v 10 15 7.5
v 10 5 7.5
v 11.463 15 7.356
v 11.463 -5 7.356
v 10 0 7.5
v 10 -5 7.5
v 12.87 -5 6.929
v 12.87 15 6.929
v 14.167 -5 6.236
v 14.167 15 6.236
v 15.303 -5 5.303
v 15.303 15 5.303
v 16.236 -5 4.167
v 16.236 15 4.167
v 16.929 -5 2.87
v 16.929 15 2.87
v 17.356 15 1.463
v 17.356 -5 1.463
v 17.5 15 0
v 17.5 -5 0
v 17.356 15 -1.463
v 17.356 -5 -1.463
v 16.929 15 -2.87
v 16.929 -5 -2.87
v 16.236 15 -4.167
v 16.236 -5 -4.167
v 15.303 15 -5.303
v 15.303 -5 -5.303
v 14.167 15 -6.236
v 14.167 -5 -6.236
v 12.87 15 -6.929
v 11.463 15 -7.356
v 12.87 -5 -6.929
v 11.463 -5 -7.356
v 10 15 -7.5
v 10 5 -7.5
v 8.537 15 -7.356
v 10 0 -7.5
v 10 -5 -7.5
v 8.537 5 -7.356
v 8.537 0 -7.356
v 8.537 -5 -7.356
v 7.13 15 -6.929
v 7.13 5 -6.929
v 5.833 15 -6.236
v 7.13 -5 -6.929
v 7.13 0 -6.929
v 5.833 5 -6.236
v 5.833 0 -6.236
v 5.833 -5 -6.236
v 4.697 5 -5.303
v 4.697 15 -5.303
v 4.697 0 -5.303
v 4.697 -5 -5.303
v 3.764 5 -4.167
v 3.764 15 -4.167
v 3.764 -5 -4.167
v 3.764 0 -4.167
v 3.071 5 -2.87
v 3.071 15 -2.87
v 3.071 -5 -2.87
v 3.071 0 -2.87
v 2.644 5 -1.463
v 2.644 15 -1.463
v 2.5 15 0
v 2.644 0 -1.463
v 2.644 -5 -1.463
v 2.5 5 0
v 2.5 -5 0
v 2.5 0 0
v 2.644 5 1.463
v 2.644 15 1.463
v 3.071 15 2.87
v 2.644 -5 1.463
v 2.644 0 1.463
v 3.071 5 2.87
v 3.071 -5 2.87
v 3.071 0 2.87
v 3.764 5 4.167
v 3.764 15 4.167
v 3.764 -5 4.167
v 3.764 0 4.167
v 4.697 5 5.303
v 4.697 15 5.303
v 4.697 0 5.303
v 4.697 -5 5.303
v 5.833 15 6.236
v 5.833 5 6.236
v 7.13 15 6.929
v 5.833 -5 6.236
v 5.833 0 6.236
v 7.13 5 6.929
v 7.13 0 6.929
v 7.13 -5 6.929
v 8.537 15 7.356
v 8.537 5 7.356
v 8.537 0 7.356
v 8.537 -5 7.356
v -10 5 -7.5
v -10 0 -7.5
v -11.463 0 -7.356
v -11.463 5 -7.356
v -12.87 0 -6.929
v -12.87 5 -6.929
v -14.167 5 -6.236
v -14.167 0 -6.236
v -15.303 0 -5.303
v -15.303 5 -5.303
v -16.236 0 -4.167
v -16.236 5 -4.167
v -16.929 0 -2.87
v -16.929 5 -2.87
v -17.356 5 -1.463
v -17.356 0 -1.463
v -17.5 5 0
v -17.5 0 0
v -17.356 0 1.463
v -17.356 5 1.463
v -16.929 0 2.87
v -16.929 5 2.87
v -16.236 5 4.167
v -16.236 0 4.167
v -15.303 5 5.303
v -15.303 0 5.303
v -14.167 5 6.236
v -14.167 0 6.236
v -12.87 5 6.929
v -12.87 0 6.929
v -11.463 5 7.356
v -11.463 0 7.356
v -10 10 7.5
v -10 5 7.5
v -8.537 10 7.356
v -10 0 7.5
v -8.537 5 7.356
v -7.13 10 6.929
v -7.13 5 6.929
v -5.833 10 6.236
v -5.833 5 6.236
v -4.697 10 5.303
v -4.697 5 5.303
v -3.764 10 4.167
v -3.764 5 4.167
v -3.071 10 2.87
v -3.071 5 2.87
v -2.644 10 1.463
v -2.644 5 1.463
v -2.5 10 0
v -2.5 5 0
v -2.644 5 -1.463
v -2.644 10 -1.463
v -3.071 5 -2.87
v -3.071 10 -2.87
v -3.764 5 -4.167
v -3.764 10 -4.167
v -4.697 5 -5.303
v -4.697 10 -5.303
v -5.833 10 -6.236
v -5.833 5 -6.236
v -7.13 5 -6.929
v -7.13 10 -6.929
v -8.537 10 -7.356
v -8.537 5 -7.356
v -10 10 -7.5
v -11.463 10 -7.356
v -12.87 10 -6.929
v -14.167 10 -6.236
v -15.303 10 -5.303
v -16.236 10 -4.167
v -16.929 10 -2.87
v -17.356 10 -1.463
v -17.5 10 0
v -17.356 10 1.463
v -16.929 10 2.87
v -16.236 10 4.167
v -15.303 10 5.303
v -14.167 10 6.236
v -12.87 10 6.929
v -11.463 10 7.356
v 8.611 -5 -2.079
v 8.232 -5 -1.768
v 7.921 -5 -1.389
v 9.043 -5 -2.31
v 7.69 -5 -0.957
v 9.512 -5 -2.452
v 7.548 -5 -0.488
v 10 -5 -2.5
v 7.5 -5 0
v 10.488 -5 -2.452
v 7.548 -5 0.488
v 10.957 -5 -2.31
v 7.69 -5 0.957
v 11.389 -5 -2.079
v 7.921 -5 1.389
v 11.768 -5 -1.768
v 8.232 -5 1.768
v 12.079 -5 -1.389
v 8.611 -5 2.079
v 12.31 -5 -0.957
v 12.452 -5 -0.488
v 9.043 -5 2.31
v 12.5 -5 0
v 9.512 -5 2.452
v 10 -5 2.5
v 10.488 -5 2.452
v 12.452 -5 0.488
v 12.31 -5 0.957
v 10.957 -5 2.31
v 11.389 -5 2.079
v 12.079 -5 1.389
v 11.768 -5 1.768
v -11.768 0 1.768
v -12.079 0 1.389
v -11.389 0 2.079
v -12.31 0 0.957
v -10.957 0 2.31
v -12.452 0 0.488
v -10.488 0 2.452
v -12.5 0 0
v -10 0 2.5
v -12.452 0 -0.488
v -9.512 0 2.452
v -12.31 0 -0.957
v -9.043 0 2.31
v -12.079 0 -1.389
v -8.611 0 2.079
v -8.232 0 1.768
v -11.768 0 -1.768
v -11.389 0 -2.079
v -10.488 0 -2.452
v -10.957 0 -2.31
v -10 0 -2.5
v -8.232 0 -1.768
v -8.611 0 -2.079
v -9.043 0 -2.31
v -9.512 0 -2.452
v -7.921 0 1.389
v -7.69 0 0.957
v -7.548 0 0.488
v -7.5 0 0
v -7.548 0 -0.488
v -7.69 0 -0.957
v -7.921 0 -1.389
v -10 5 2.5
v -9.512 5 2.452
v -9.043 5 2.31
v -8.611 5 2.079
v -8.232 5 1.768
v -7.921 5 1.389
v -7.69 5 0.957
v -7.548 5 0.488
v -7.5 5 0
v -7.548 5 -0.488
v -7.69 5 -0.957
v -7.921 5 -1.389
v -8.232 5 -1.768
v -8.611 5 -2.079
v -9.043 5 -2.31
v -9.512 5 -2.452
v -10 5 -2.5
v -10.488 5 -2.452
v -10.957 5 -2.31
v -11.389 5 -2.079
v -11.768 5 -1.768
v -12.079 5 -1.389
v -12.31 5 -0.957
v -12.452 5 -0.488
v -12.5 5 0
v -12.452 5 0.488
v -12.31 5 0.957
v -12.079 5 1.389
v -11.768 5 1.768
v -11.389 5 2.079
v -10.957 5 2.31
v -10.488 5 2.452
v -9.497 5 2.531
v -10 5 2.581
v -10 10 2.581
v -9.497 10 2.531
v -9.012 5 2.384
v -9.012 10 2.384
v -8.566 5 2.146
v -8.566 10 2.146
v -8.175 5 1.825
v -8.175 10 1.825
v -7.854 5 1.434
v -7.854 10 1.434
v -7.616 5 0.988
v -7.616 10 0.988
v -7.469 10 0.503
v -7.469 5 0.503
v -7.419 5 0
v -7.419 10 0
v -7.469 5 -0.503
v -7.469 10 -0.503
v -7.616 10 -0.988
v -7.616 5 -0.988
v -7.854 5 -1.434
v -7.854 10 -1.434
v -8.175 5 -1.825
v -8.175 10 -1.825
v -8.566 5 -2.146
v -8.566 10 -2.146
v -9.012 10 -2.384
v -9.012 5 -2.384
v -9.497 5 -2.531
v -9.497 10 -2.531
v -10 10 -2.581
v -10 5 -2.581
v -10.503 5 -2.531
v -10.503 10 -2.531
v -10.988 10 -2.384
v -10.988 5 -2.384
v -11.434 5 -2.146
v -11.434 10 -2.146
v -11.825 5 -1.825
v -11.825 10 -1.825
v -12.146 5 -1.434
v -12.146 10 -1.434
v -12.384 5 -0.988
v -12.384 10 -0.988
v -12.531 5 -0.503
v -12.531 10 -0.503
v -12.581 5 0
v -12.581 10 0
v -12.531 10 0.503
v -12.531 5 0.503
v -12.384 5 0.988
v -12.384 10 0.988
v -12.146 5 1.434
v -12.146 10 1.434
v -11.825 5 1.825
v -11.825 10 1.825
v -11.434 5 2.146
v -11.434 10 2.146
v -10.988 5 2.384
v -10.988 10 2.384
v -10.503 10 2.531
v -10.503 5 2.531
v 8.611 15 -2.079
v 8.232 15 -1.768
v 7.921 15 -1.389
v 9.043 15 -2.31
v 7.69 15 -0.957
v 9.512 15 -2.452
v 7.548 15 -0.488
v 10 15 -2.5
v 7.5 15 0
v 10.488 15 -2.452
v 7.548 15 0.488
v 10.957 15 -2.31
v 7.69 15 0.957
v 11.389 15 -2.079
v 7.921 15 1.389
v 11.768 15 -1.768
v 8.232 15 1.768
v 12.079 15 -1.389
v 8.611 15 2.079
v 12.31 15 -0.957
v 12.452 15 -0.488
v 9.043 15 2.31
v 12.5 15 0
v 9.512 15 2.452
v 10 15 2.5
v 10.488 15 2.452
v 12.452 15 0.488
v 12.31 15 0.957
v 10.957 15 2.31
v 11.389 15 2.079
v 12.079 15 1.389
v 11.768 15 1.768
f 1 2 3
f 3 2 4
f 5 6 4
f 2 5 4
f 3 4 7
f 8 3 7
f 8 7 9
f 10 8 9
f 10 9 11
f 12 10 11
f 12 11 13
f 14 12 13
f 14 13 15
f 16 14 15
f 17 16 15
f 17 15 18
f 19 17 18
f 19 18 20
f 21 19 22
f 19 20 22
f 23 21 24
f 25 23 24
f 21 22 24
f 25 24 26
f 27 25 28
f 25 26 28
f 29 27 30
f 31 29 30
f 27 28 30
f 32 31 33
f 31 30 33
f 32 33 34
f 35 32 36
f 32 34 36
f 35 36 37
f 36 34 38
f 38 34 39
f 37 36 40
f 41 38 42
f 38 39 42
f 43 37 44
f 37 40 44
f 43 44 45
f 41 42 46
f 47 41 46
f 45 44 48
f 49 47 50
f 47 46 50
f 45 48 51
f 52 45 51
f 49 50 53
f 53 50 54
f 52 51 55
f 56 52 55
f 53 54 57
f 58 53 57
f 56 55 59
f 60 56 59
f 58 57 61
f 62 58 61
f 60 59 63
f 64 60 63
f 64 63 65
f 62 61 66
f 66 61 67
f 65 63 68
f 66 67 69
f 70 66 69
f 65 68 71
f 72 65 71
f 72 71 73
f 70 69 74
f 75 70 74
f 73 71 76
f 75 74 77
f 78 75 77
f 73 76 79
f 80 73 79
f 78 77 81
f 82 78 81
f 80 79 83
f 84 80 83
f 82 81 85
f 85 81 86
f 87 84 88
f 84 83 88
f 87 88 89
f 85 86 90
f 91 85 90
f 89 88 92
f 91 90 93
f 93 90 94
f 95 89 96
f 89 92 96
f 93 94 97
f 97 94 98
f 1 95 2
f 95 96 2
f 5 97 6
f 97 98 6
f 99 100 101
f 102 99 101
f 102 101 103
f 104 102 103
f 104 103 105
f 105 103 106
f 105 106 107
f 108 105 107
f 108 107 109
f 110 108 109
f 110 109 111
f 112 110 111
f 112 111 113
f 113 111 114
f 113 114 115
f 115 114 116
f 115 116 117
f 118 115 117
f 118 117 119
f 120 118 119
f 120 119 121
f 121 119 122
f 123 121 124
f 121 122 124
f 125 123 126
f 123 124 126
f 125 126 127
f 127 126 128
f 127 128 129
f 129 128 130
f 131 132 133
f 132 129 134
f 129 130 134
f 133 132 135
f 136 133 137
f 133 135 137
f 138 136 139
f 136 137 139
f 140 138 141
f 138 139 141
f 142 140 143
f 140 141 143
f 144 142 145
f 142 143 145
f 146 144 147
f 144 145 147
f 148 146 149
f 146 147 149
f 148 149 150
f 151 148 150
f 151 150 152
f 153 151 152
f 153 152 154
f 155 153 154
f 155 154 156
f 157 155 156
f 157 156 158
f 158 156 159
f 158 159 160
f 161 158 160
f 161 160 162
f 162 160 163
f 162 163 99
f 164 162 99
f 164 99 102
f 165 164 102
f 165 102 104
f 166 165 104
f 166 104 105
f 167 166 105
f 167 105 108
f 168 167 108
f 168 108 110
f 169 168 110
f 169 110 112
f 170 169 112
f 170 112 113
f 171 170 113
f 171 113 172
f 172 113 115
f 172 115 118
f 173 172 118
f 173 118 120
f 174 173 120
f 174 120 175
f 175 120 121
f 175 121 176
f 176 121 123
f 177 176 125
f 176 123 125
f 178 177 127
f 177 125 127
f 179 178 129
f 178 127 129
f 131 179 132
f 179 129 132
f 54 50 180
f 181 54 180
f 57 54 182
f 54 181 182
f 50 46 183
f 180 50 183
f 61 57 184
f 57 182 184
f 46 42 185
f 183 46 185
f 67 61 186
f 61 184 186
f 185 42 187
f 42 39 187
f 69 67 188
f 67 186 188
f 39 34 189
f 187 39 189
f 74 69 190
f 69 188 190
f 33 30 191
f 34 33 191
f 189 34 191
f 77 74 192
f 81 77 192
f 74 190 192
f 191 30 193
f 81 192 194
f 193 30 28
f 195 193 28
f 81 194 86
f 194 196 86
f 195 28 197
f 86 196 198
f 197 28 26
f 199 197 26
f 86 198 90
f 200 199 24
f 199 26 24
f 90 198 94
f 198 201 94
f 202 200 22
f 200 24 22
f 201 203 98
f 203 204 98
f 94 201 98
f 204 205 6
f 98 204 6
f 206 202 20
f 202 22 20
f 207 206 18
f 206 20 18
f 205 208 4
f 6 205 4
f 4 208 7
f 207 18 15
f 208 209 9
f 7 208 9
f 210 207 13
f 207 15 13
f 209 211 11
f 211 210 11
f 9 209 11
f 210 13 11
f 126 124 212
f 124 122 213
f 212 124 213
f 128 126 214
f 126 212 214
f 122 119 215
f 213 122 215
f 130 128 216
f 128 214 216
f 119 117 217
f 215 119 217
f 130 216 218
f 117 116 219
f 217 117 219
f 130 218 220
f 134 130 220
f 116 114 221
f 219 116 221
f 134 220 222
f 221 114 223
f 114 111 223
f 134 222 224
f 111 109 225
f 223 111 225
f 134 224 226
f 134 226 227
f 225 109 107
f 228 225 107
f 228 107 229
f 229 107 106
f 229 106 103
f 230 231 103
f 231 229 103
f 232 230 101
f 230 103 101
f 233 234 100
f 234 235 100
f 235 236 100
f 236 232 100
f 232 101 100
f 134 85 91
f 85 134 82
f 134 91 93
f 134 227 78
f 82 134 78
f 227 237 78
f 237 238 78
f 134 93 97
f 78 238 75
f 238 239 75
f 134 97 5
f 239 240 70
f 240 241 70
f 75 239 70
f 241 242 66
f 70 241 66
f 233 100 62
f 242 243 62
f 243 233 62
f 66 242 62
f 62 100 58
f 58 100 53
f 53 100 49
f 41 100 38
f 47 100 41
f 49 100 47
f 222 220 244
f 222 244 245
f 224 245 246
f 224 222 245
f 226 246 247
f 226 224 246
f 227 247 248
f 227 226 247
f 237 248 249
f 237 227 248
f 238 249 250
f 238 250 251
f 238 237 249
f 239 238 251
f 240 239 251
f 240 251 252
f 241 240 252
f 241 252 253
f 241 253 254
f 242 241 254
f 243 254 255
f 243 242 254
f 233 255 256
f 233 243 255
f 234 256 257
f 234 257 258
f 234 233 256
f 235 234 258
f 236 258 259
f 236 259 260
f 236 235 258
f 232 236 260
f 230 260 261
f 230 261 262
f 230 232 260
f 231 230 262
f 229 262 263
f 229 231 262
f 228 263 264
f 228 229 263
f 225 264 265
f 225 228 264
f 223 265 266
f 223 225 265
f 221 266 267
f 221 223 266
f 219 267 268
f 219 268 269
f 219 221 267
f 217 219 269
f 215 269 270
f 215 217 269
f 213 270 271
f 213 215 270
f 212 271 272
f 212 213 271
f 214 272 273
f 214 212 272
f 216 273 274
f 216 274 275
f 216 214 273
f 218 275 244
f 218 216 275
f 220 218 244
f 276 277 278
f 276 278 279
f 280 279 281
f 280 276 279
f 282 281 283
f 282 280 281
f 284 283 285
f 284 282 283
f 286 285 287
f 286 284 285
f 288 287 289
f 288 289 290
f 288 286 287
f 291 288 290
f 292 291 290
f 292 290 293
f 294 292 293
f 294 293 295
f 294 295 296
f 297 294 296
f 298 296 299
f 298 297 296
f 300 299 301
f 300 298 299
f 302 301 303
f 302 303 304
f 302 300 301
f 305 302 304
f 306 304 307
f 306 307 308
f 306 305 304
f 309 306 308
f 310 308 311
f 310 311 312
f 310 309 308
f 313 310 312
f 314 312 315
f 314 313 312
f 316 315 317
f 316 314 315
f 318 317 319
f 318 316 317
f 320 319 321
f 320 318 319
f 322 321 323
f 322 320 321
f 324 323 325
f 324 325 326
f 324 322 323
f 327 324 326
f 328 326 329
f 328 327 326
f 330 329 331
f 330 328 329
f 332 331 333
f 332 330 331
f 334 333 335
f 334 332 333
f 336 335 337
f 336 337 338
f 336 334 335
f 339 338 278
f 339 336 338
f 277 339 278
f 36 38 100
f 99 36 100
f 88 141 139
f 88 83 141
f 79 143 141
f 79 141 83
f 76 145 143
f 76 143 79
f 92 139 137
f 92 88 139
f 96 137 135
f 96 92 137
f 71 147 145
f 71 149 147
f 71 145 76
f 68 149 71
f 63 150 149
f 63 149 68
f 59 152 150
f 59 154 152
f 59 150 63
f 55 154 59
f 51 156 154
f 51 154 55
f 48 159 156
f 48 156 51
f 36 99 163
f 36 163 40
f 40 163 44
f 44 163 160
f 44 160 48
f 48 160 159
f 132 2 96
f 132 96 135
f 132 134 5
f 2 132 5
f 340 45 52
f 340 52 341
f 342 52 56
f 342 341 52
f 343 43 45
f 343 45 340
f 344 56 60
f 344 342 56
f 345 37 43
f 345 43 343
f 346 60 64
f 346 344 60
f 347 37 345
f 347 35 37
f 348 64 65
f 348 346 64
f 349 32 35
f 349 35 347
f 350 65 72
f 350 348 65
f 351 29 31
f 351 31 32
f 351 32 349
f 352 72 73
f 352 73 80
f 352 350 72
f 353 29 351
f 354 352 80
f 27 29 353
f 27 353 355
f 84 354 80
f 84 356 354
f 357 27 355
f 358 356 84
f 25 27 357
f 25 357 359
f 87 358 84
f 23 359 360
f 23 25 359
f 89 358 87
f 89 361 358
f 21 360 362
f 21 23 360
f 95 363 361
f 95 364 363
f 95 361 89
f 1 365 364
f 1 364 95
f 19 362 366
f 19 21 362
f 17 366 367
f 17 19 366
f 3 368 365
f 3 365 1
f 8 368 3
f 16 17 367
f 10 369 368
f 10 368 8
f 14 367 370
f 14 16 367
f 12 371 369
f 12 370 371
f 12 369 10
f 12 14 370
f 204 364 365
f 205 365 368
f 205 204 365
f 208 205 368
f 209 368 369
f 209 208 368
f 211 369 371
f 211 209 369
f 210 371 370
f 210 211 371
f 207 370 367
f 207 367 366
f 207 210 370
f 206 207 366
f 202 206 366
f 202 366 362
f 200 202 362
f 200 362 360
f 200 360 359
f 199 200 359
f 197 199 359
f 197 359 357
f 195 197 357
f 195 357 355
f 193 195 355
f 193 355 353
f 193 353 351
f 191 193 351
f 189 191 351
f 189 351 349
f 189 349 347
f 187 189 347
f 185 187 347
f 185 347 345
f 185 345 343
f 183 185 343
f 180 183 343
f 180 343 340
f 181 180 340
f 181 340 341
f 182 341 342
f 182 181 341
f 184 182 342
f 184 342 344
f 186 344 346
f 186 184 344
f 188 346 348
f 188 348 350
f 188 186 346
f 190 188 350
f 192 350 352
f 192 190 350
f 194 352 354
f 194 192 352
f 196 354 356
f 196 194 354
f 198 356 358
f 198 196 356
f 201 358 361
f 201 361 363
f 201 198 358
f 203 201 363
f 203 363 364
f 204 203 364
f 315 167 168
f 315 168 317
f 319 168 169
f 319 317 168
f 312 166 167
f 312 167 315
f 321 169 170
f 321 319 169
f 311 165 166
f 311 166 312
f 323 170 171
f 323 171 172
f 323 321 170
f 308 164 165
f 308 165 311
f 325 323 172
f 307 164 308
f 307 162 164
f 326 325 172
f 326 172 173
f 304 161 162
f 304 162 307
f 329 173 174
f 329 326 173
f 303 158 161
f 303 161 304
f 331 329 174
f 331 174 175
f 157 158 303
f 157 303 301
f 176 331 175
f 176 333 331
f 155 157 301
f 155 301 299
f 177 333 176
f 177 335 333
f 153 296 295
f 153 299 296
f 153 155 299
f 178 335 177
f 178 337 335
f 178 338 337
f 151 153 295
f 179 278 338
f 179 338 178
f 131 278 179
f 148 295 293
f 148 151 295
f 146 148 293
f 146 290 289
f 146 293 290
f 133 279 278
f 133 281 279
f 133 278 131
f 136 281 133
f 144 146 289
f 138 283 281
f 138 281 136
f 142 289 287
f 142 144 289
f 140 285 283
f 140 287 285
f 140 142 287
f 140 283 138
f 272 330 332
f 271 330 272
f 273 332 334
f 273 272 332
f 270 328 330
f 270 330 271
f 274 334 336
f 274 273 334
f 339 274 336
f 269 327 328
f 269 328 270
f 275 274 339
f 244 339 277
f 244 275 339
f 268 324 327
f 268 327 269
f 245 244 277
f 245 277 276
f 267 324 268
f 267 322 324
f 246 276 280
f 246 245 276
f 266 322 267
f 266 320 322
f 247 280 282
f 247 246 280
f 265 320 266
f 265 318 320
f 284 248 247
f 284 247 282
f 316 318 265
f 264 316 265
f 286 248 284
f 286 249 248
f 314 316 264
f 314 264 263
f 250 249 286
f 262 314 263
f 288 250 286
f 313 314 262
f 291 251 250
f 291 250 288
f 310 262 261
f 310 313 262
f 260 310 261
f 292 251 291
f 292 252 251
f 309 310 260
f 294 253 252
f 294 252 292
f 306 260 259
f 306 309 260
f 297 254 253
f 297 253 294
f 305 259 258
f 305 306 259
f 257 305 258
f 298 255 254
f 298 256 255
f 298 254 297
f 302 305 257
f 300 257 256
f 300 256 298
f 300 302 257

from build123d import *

# Parameters (mm, degrees)
CROQUIS1_R                   = 2.5
SALIENTE_EXTRUIR1_DEPTH      = 5
CROQUIS2_R                   = 7.5
CROQUIS2_R_2                 = 2.58081611
SALIENTE_EXTRUIR2_DEPTH      = 5
SALIENTE_EXTRUIR3_DEPTH      = 10
SALIENTE_EXTRUIR3_DEPTH_BACK = 10
CROQUIS3_R                   = 7.5
CROQUIS3_R_2                 = 2.5


with BuildPart() as part:
    # Croquis1 → Saliente-Extruir1 (new body)
    with BuildSketch(Plane(origin=(0, 0, 0), x_dir=(1, 0, 0), z_dir=(0, 1, 0))):
        with BuildLine():
            ThreePointArc((-10, 7.5), (-17.5, 0), (-10, -7.5))
            Line((-10, -7.5), (10, -7.5))
            ThreePointArc((10, -7.5), (17.5, 0), (10, 7.5))
            Line((10, 7.5), (-10, 7.5))
        make_face()
        with Locations(Location((-10, 0, 0), (0, 0, 270))):
            Circle(CROQUIS1_R, mode=Mode.SUBTRACT)
        with Locations(Location((10, 0, 0), (0, 0, 270))):
            Circle(CROQUIS1_R, mode=Mode.SUBTRACT)
    extrude(amount=SALIENTE_EXTRUIR1_DEPTH)

    # Croquis2 → Saliente-Extruir2 (add)
    with BuildSketch(Plane(origin=(0, 5, 0), x_dir=(1, 0, 0), z_dir=(0, 1, 0))):
        with Locations(Location((-10, 0, 0), (0, 0, 270))):
            Circle(CROQUIS2_R)
        with Locations(Location((-10, 0, 0), (0, 0, 270))):
            Circle(CROQUIS2_R_2, mode=Mode.SUBTRACT)
    extrude(amount=SALIENTE_EXTRUIR2_DEPTH)

    # Croquis3 → Saliente-Extruir3 (add, two sides: drawn at the far end of the back side and taken through both)
    with BuildSketch(Plane(origin=(0, 5, 0), x_dir=(1, 0, 0), z_dir=(0, 1, 0)).offset(-SALIENTE_EXTRUIR3_DEPTH_BACK)):
        with Locations(Location((10, 0, 0), (0, 0, 270))):
            Circle(CROQUIS3_R)
        with Locations(Location((10, 0, 0), (0, 0, 270))):
            Circle(CROQUIS3_R_2, mode=Mode.SUBTRACT)
    extrude(amount=SALIENTE_EXTRUIR3_DEPTH + SALIENTE_EXTRUIR3_DEPTH_BACK)


solid = part.part
